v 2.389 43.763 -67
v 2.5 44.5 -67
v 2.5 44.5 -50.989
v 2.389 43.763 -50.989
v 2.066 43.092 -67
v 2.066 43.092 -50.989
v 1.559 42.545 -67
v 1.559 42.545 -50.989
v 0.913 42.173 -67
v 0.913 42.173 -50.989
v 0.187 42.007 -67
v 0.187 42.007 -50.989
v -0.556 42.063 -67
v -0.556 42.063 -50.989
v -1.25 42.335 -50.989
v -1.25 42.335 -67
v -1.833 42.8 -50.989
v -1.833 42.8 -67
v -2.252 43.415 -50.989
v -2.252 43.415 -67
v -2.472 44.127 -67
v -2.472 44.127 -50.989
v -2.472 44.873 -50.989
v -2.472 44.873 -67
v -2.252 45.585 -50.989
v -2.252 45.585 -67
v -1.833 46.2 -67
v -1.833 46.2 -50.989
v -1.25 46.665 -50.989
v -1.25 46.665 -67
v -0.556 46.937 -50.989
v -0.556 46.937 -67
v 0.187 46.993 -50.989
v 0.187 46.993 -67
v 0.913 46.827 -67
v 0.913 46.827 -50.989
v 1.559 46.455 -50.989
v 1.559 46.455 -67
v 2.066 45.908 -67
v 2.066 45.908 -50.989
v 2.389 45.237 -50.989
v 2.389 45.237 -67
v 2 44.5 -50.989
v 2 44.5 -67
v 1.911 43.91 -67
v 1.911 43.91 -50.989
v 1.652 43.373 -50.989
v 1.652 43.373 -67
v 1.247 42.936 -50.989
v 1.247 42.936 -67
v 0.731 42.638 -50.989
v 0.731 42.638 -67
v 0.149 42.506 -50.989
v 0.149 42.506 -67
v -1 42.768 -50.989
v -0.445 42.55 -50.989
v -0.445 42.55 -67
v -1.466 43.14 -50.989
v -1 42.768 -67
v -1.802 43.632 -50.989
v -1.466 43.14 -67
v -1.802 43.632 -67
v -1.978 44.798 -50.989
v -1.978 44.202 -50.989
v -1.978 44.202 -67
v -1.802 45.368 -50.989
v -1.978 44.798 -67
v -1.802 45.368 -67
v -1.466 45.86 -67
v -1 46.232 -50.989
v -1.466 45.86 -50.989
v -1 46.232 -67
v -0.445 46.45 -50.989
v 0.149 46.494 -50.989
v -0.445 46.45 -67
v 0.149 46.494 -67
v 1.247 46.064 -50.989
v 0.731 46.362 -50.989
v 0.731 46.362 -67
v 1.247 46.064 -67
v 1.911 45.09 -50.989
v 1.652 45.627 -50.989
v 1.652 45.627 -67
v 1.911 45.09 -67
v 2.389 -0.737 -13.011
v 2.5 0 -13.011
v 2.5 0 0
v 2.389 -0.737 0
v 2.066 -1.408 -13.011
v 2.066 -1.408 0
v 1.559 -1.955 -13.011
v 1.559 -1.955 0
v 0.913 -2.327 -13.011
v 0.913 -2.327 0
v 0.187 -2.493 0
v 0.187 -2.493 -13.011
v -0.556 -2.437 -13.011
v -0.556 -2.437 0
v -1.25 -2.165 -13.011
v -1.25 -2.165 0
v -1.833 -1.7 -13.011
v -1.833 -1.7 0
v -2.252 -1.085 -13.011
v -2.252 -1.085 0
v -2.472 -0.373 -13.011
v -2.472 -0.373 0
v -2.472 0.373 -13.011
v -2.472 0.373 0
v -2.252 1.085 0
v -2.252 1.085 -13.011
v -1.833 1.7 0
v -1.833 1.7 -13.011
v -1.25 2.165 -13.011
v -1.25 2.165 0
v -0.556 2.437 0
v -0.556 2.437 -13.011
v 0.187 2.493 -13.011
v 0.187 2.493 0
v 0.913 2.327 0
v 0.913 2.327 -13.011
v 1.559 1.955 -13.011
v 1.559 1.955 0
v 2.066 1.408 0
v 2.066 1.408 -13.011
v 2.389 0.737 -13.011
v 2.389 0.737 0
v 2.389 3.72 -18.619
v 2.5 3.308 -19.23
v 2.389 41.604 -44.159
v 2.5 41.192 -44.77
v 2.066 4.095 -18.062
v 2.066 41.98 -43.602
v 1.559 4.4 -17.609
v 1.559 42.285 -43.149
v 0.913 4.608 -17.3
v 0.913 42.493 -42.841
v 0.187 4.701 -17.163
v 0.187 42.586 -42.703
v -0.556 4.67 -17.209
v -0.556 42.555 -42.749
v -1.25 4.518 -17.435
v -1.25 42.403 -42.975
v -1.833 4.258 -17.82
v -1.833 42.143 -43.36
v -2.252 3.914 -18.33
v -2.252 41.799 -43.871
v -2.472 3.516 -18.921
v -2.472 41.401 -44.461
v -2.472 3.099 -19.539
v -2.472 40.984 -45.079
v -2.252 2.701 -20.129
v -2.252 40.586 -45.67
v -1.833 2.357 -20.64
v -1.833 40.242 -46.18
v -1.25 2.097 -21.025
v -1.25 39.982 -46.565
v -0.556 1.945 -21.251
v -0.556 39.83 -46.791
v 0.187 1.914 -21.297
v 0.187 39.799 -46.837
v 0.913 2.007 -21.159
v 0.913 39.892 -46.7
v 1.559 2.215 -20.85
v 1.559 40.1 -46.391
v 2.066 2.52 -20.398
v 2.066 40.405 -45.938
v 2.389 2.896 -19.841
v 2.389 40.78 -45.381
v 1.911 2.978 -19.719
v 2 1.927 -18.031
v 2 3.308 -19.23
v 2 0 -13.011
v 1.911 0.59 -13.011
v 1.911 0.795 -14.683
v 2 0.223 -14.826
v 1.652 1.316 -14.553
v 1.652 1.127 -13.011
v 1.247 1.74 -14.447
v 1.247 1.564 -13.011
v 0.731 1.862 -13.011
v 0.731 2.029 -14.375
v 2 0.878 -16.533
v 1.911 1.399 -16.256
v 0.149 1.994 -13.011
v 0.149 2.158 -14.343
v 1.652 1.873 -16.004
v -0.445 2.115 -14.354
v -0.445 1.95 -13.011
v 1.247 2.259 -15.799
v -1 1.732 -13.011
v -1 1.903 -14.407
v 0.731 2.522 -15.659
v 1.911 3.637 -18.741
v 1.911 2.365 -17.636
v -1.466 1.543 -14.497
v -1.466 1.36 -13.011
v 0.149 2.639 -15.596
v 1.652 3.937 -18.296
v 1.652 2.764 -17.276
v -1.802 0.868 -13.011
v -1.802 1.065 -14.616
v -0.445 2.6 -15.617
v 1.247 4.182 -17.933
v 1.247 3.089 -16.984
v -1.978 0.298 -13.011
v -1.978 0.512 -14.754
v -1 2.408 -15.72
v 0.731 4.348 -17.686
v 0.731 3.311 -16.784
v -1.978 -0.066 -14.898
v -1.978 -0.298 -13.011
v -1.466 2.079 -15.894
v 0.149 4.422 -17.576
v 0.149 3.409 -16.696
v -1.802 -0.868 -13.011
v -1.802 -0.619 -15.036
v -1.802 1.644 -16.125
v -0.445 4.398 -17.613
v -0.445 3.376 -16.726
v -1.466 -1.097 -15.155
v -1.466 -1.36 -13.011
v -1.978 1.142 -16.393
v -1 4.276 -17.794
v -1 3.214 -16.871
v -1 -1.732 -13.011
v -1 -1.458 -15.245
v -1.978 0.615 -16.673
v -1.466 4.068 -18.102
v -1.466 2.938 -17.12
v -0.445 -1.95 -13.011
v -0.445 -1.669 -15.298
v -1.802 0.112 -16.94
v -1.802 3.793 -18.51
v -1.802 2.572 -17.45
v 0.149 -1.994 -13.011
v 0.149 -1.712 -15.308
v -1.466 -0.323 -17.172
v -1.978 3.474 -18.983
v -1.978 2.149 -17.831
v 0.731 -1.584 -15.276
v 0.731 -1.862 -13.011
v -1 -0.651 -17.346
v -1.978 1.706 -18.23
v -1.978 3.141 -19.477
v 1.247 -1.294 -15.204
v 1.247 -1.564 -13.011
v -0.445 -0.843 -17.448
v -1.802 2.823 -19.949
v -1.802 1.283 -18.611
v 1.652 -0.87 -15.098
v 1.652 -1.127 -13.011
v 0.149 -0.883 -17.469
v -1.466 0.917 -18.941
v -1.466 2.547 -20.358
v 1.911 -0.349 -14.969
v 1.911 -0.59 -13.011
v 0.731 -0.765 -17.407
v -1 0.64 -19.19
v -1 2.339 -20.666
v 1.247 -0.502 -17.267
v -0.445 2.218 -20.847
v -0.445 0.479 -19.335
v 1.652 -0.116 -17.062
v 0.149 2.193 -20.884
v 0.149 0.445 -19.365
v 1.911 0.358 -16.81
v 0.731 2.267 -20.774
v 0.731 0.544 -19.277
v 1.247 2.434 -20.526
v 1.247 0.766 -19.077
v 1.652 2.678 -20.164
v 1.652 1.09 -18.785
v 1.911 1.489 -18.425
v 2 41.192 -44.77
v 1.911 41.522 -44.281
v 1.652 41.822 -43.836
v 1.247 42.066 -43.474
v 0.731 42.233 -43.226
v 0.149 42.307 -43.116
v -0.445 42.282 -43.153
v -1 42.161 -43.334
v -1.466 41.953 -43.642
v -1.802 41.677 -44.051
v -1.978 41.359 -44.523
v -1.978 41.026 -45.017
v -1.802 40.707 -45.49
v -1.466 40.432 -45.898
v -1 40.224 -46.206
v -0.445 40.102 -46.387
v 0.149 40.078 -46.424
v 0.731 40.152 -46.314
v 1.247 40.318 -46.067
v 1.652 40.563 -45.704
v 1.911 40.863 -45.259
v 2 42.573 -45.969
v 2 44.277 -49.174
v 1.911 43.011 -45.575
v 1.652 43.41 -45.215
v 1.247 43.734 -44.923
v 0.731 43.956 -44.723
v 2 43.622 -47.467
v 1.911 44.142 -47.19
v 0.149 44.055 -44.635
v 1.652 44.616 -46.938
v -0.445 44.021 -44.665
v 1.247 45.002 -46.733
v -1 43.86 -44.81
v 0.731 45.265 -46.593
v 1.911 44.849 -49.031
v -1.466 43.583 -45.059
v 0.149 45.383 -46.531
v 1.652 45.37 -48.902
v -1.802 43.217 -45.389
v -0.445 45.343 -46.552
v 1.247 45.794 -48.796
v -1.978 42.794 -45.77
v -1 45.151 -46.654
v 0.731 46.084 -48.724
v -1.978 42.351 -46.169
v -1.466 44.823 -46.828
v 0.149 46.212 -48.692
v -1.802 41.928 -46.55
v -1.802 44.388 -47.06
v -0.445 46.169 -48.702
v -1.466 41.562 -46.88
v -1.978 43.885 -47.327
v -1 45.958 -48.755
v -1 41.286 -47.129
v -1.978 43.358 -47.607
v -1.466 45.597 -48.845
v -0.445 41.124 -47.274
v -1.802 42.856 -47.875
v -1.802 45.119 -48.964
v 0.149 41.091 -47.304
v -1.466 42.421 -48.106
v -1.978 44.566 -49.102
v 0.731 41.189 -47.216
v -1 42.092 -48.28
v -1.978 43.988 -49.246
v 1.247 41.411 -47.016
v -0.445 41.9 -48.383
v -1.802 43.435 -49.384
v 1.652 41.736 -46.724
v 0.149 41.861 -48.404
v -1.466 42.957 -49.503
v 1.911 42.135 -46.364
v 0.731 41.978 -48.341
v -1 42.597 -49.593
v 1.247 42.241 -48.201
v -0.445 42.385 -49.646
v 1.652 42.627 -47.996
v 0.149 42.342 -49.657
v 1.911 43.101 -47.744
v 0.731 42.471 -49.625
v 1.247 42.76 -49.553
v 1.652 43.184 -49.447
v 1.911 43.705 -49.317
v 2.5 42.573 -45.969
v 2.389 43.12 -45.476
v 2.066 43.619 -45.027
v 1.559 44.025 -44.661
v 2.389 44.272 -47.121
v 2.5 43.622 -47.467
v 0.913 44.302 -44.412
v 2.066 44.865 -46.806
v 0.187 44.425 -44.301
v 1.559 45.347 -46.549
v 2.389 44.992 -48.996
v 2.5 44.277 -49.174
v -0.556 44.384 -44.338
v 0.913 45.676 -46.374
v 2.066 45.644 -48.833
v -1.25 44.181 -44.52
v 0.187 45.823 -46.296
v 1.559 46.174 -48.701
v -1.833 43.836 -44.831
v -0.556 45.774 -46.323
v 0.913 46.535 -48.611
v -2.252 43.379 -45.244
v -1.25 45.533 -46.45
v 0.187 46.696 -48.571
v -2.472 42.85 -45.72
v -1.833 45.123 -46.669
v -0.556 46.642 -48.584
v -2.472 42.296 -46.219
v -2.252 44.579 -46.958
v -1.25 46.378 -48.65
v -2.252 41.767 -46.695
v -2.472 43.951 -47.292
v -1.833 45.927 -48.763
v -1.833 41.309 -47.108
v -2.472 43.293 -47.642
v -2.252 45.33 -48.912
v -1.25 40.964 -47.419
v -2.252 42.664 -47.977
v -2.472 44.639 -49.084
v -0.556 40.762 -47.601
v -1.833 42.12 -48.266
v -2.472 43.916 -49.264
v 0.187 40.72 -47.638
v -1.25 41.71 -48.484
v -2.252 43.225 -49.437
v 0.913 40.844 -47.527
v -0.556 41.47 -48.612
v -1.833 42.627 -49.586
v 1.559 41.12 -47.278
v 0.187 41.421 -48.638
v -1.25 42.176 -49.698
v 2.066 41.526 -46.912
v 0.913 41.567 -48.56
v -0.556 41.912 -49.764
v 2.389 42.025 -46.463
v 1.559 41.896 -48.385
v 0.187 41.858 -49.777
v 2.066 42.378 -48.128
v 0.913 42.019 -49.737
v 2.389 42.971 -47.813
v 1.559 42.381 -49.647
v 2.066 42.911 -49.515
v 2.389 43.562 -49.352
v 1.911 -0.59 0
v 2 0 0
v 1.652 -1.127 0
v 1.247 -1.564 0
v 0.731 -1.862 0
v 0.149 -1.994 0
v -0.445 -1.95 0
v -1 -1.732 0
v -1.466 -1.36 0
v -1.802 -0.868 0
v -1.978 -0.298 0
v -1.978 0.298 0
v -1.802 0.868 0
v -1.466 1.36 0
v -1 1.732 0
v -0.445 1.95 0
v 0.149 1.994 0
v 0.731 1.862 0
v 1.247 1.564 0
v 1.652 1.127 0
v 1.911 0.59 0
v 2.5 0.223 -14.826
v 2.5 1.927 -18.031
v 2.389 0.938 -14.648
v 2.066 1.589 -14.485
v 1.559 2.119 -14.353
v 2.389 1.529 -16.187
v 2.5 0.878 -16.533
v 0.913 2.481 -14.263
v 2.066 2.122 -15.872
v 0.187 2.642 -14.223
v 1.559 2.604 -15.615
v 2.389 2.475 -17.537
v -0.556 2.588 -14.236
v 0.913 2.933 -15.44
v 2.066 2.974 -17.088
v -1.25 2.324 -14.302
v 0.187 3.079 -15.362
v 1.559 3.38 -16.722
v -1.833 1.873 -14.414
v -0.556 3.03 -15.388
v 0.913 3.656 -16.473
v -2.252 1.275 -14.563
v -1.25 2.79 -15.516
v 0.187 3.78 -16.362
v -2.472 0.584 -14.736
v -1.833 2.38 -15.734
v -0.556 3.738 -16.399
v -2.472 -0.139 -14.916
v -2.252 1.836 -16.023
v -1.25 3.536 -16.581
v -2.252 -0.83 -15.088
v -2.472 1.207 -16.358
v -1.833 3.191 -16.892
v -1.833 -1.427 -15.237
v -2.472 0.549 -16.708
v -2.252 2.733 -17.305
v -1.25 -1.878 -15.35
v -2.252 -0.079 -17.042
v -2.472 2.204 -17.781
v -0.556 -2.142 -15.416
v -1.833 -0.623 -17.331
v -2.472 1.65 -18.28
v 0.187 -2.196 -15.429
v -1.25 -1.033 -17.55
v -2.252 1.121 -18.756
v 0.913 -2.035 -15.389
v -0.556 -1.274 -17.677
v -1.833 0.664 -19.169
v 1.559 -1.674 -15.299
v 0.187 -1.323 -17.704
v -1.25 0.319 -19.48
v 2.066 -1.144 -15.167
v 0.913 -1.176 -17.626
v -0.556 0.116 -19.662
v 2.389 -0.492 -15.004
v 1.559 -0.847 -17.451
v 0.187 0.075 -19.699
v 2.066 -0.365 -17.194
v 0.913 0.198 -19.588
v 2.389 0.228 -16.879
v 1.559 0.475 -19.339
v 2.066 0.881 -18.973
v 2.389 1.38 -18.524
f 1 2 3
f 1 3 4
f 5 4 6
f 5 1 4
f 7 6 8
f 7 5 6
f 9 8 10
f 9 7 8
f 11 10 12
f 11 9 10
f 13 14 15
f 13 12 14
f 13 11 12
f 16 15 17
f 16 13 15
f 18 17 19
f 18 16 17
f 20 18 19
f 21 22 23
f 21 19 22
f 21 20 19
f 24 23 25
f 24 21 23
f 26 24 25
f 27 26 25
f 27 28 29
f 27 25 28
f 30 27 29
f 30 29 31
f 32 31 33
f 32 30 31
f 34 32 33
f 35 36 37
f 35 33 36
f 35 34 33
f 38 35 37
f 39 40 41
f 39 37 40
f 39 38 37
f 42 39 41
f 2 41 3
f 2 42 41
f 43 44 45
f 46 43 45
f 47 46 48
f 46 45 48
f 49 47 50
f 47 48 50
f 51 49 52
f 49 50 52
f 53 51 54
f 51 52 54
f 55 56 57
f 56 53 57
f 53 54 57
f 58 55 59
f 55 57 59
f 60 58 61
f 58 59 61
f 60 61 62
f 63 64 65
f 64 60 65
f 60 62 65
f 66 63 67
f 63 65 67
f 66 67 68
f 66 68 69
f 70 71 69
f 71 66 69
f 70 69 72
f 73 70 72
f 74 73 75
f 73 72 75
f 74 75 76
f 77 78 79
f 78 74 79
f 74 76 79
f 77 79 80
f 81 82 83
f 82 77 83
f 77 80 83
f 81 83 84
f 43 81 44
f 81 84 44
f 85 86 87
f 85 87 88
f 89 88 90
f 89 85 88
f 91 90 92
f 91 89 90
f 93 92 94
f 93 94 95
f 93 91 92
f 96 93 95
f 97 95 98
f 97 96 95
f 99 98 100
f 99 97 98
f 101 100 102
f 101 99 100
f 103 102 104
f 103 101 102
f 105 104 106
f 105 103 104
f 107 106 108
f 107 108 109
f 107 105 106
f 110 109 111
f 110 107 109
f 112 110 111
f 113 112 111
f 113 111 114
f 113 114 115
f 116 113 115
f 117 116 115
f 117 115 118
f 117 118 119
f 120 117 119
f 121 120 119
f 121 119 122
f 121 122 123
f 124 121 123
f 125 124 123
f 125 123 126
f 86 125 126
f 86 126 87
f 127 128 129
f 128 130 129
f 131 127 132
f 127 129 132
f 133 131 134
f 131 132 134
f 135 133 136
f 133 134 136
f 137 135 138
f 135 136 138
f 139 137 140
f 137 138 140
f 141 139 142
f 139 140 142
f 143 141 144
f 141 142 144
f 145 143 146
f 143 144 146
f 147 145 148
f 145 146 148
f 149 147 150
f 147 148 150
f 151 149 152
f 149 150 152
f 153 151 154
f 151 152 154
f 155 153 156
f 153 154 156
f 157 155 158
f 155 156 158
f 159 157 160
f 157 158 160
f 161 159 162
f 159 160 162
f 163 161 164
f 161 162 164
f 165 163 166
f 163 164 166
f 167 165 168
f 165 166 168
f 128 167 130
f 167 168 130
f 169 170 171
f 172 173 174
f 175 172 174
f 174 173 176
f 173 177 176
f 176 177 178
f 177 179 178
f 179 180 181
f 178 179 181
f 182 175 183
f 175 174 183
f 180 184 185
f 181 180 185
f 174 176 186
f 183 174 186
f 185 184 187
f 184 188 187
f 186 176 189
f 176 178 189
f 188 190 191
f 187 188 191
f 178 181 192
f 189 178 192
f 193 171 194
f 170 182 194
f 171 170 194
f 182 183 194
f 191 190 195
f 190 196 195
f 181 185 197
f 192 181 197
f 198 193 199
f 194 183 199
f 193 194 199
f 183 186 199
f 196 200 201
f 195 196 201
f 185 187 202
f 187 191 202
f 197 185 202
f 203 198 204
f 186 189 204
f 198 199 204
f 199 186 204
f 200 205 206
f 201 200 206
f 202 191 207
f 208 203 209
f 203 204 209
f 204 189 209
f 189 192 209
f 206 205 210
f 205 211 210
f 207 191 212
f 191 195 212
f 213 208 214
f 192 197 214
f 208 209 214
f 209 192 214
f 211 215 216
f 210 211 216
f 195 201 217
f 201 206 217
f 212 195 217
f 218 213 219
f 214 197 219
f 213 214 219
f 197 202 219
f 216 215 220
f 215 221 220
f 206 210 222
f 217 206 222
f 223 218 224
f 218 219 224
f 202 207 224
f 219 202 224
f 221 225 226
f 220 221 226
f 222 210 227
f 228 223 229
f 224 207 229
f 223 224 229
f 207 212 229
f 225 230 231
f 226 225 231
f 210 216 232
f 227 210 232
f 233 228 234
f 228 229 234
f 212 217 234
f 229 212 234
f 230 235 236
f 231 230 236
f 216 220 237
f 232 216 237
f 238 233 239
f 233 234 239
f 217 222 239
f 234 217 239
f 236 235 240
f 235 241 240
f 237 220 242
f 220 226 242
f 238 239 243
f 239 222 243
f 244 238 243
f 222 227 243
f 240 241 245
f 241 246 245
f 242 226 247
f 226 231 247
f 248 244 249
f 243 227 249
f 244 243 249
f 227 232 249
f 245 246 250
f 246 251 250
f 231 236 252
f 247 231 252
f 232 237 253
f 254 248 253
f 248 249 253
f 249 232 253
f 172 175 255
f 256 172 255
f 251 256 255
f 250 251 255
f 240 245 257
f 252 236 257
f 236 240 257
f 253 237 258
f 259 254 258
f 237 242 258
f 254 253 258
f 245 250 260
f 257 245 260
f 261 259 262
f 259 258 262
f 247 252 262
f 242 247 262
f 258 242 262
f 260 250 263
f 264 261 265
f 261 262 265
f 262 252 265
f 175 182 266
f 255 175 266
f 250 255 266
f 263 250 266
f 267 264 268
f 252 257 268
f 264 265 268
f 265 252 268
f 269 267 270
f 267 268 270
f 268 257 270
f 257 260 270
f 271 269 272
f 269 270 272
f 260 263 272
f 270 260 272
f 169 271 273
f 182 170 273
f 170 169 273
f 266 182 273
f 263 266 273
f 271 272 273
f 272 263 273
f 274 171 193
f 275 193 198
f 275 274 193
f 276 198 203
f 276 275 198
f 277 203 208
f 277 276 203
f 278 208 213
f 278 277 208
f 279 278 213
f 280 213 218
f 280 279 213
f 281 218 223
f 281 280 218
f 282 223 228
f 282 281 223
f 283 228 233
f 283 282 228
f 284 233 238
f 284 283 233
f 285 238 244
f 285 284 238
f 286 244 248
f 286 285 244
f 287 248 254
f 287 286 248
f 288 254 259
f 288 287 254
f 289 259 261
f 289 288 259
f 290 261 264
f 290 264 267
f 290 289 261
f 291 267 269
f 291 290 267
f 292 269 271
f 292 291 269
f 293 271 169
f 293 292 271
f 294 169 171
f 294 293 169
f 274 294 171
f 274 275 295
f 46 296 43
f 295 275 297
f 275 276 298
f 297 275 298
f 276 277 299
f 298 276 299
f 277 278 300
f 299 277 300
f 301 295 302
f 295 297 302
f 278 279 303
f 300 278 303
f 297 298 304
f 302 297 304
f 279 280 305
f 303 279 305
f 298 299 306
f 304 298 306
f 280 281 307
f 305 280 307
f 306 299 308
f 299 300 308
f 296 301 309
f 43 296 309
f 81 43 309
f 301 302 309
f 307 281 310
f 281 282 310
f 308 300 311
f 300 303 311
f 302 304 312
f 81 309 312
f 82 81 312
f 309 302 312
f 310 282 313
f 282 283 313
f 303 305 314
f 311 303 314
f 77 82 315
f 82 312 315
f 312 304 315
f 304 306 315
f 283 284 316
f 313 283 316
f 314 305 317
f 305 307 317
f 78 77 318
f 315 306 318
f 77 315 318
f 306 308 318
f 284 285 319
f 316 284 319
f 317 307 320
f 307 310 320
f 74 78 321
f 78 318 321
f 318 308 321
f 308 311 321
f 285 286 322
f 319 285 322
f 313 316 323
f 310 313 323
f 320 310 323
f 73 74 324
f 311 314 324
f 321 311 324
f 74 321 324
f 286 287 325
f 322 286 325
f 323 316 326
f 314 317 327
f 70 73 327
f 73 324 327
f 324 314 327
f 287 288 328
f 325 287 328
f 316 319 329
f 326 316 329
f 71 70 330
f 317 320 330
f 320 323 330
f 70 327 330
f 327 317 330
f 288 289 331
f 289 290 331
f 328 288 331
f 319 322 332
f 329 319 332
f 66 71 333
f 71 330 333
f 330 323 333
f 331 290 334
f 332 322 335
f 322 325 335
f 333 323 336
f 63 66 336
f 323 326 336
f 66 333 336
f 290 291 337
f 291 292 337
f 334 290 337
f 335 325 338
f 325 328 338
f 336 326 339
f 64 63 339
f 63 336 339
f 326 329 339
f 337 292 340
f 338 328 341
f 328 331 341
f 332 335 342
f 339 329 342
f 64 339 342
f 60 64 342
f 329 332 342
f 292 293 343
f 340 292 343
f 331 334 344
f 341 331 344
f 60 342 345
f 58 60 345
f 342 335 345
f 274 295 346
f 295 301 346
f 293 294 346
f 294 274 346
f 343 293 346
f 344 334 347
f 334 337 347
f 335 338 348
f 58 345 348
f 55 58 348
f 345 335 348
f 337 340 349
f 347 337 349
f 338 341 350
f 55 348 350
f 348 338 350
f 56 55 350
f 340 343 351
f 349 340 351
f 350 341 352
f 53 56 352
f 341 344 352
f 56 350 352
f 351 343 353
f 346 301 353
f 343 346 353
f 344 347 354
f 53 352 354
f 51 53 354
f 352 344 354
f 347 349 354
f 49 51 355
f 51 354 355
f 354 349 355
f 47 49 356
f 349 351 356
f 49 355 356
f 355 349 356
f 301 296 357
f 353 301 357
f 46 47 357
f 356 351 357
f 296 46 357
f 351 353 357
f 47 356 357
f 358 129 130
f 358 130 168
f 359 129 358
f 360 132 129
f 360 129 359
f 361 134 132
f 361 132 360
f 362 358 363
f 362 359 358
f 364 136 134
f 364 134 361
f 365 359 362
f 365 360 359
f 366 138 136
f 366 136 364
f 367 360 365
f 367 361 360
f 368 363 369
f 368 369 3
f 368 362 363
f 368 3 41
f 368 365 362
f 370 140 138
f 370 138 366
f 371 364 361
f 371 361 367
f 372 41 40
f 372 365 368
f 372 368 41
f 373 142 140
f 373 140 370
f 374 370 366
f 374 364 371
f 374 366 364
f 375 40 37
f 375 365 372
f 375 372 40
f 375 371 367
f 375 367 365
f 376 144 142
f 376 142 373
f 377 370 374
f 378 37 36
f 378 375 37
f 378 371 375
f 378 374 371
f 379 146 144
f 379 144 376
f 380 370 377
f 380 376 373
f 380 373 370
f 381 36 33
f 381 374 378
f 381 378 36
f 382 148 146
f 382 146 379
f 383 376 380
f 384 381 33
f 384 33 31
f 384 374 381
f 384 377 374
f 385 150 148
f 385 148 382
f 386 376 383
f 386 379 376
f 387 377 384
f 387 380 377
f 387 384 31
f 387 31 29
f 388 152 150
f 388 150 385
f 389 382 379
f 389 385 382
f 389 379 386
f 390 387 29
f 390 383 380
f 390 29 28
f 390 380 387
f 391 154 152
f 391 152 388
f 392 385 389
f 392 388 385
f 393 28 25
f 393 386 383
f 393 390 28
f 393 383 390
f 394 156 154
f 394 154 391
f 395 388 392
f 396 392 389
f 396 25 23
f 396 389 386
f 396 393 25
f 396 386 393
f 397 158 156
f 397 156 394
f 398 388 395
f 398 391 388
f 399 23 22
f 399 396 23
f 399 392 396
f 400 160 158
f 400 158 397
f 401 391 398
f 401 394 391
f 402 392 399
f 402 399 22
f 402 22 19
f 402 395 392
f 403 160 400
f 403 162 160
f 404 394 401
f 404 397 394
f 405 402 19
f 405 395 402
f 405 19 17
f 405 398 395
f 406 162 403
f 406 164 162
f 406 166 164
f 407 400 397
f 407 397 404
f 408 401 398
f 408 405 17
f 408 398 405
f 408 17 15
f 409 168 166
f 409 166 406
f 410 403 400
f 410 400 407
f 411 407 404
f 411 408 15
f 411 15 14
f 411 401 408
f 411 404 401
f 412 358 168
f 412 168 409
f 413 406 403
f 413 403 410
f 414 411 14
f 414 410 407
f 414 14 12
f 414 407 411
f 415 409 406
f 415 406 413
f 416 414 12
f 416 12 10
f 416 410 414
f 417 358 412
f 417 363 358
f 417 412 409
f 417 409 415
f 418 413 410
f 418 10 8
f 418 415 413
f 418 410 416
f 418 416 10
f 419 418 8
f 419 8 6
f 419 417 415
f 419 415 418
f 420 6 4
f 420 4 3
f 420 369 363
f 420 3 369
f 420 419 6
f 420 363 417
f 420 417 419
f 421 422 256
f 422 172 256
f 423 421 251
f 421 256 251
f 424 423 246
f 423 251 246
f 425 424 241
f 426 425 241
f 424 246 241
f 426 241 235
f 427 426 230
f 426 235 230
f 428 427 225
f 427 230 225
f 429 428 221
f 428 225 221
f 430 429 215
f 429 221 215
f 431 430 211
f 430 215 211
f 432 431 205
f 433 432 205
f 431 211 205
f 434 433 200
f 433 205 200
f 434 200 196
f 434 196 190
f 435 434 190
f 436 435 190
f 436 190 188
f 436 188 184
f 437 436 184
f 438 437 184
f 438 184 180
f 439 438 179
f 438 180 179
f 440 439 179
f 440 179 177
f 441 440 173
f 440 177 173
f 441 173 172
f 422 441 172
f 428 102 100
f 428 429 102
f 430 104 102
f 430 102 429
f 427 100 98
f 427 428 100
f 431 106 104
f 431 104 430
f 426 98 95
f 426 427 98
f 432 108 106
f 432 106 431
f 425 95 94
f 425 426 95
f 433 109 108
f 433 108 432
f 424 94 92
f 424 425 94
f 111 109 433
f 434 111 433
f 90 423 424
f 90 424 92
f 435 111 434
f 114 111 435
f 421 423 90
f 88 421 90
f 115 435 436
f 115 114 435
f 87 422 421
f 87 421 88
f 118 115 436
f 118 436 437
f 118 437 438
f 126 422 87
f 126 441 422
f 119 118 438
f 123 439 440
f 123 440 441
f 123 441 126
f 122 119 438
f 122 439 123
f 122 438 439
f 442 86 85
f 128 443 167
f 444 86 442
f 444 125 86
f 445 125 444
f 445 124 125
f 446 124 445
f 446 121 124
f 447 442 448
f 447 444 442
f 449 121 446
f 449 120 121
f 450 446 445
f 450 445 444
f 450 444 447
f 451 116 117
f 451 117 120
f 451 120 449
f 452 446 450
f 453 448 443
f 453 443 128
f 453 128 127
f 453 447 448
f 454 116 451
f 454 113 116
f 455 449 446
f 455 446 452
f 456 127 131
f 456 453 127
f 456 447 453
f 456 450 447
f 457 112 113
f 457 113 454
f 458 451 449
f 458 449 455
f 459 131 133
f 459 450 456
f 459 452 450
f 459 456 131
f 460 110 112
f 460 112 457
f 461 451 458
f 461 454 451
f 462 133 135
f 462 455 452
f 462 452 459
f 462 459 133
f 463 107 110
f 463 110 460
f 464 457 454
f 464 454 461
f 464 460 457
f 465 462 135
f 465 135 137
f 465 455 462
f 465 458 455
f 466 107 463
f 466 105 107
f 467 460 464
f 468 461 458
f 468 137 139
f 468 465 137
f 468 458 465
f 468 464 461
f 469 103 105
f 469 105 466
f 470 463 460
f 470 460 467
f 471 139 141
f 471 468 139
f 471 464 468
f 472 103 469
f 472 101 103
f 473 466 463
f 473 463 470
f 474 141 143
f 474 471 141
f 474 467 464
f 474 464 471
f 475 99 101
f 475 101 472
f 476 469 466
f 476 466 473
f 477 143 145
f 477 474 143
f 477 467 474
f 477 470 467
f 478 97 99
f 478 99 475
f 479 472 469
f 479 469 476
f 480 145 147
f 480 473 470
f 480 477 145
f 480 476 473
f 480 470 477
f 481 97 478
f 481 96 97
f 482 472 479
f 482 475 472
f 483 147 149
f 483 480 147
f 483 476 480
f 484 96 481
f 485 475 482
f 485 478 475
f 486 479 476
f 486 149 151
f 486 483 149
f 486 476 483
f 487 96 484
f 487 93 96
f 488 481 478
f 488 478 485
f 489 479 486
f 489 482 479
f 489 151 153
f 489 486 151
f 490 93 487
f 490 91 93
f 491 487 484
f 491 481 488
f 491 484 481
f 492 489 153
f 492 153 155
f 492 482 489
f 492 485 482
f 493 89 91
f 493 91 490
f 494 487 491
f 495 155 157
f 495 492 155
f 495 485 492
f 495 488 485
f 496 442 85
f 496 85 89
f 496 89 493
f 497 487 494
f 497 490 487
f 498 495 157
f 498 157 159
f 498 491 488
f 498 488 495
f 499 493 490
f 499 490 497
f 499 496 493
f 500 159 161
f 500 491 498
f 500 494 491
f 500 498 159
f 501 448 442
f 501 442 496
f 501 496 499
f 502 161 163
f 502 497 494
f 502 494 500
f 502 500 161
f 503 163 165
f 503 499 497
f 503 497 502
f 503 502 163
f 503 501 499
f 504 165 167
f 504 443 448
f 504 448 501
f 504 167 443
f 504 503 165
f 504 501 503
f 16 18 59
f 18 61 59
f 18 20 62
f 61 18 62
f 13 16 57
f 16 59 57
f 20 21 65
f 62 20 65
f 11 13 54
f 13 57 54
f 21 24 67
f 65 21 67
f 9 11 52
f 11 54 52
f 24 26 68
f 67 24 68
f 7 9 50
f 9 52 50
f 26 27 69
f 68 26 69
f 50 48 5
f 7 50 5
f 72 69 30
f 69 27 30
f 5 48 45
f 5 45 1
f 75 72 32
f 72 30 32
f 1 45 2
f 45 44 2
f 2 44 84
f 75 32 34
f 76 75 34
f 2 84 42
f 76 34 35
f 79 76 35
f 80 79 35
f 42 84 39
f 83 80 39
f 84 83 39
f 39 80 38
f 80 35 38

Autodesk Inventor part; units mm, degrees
ref_plane "YZ Plane" through (0, 0, 0) normal (1, 0, 0) x (0, 1, 0)
ref_plane "XZ Plane" through (0, 0, 0) normal (0, 1, 0) x (-1, 0, 0)
ref_plane "XY Plane" through (0, 0, 0) normal (0, 0, 1) x (1, 0, 0)
sketch "Sketch1" plane through (0, 0, 0) normal (0, 0, 1) x (1, 0, 0)
  circle A0 centre (0, 0) radius 2.5
  dimension "d0" = 5
sketch "Sketch3" plane through (0, 0, 0) normal (1, 0, 0) x (0, 1, 0)
  line L0 (0, 0) -> (0, -13.011)
  line L1 (3.3076, -19.2298) -> (41.1924, -44.7702)
  line L2 (44.5, -50.989) -> (44.5, -67)
  arc A0 (0, -13.011) -> (3.3076, -19.2298) centre (7.5, -13.011) ccw
  arc A1 (44.5, -50.989) -> (41.1924, -44.7702) centre (37, -50.989) ccw
  point P0 (0, -17)
  point P1 (44.5, -47)
  dimension "d1" = 17
  dimension "d2" = 30
  dimension "d3" = 44.5
  dimension "d4" = 20
  dimension "d5" = 7.5
sweep "Sweep1" add profiles "Sketch1" path "Sketch3"
shell "Shell1" thickness 0.5 removed faces 2 at (1.2757, -0.3919, 0) at (0.6238, 43.9474, -67)
properties part number "158" material "Iron, Gray"
